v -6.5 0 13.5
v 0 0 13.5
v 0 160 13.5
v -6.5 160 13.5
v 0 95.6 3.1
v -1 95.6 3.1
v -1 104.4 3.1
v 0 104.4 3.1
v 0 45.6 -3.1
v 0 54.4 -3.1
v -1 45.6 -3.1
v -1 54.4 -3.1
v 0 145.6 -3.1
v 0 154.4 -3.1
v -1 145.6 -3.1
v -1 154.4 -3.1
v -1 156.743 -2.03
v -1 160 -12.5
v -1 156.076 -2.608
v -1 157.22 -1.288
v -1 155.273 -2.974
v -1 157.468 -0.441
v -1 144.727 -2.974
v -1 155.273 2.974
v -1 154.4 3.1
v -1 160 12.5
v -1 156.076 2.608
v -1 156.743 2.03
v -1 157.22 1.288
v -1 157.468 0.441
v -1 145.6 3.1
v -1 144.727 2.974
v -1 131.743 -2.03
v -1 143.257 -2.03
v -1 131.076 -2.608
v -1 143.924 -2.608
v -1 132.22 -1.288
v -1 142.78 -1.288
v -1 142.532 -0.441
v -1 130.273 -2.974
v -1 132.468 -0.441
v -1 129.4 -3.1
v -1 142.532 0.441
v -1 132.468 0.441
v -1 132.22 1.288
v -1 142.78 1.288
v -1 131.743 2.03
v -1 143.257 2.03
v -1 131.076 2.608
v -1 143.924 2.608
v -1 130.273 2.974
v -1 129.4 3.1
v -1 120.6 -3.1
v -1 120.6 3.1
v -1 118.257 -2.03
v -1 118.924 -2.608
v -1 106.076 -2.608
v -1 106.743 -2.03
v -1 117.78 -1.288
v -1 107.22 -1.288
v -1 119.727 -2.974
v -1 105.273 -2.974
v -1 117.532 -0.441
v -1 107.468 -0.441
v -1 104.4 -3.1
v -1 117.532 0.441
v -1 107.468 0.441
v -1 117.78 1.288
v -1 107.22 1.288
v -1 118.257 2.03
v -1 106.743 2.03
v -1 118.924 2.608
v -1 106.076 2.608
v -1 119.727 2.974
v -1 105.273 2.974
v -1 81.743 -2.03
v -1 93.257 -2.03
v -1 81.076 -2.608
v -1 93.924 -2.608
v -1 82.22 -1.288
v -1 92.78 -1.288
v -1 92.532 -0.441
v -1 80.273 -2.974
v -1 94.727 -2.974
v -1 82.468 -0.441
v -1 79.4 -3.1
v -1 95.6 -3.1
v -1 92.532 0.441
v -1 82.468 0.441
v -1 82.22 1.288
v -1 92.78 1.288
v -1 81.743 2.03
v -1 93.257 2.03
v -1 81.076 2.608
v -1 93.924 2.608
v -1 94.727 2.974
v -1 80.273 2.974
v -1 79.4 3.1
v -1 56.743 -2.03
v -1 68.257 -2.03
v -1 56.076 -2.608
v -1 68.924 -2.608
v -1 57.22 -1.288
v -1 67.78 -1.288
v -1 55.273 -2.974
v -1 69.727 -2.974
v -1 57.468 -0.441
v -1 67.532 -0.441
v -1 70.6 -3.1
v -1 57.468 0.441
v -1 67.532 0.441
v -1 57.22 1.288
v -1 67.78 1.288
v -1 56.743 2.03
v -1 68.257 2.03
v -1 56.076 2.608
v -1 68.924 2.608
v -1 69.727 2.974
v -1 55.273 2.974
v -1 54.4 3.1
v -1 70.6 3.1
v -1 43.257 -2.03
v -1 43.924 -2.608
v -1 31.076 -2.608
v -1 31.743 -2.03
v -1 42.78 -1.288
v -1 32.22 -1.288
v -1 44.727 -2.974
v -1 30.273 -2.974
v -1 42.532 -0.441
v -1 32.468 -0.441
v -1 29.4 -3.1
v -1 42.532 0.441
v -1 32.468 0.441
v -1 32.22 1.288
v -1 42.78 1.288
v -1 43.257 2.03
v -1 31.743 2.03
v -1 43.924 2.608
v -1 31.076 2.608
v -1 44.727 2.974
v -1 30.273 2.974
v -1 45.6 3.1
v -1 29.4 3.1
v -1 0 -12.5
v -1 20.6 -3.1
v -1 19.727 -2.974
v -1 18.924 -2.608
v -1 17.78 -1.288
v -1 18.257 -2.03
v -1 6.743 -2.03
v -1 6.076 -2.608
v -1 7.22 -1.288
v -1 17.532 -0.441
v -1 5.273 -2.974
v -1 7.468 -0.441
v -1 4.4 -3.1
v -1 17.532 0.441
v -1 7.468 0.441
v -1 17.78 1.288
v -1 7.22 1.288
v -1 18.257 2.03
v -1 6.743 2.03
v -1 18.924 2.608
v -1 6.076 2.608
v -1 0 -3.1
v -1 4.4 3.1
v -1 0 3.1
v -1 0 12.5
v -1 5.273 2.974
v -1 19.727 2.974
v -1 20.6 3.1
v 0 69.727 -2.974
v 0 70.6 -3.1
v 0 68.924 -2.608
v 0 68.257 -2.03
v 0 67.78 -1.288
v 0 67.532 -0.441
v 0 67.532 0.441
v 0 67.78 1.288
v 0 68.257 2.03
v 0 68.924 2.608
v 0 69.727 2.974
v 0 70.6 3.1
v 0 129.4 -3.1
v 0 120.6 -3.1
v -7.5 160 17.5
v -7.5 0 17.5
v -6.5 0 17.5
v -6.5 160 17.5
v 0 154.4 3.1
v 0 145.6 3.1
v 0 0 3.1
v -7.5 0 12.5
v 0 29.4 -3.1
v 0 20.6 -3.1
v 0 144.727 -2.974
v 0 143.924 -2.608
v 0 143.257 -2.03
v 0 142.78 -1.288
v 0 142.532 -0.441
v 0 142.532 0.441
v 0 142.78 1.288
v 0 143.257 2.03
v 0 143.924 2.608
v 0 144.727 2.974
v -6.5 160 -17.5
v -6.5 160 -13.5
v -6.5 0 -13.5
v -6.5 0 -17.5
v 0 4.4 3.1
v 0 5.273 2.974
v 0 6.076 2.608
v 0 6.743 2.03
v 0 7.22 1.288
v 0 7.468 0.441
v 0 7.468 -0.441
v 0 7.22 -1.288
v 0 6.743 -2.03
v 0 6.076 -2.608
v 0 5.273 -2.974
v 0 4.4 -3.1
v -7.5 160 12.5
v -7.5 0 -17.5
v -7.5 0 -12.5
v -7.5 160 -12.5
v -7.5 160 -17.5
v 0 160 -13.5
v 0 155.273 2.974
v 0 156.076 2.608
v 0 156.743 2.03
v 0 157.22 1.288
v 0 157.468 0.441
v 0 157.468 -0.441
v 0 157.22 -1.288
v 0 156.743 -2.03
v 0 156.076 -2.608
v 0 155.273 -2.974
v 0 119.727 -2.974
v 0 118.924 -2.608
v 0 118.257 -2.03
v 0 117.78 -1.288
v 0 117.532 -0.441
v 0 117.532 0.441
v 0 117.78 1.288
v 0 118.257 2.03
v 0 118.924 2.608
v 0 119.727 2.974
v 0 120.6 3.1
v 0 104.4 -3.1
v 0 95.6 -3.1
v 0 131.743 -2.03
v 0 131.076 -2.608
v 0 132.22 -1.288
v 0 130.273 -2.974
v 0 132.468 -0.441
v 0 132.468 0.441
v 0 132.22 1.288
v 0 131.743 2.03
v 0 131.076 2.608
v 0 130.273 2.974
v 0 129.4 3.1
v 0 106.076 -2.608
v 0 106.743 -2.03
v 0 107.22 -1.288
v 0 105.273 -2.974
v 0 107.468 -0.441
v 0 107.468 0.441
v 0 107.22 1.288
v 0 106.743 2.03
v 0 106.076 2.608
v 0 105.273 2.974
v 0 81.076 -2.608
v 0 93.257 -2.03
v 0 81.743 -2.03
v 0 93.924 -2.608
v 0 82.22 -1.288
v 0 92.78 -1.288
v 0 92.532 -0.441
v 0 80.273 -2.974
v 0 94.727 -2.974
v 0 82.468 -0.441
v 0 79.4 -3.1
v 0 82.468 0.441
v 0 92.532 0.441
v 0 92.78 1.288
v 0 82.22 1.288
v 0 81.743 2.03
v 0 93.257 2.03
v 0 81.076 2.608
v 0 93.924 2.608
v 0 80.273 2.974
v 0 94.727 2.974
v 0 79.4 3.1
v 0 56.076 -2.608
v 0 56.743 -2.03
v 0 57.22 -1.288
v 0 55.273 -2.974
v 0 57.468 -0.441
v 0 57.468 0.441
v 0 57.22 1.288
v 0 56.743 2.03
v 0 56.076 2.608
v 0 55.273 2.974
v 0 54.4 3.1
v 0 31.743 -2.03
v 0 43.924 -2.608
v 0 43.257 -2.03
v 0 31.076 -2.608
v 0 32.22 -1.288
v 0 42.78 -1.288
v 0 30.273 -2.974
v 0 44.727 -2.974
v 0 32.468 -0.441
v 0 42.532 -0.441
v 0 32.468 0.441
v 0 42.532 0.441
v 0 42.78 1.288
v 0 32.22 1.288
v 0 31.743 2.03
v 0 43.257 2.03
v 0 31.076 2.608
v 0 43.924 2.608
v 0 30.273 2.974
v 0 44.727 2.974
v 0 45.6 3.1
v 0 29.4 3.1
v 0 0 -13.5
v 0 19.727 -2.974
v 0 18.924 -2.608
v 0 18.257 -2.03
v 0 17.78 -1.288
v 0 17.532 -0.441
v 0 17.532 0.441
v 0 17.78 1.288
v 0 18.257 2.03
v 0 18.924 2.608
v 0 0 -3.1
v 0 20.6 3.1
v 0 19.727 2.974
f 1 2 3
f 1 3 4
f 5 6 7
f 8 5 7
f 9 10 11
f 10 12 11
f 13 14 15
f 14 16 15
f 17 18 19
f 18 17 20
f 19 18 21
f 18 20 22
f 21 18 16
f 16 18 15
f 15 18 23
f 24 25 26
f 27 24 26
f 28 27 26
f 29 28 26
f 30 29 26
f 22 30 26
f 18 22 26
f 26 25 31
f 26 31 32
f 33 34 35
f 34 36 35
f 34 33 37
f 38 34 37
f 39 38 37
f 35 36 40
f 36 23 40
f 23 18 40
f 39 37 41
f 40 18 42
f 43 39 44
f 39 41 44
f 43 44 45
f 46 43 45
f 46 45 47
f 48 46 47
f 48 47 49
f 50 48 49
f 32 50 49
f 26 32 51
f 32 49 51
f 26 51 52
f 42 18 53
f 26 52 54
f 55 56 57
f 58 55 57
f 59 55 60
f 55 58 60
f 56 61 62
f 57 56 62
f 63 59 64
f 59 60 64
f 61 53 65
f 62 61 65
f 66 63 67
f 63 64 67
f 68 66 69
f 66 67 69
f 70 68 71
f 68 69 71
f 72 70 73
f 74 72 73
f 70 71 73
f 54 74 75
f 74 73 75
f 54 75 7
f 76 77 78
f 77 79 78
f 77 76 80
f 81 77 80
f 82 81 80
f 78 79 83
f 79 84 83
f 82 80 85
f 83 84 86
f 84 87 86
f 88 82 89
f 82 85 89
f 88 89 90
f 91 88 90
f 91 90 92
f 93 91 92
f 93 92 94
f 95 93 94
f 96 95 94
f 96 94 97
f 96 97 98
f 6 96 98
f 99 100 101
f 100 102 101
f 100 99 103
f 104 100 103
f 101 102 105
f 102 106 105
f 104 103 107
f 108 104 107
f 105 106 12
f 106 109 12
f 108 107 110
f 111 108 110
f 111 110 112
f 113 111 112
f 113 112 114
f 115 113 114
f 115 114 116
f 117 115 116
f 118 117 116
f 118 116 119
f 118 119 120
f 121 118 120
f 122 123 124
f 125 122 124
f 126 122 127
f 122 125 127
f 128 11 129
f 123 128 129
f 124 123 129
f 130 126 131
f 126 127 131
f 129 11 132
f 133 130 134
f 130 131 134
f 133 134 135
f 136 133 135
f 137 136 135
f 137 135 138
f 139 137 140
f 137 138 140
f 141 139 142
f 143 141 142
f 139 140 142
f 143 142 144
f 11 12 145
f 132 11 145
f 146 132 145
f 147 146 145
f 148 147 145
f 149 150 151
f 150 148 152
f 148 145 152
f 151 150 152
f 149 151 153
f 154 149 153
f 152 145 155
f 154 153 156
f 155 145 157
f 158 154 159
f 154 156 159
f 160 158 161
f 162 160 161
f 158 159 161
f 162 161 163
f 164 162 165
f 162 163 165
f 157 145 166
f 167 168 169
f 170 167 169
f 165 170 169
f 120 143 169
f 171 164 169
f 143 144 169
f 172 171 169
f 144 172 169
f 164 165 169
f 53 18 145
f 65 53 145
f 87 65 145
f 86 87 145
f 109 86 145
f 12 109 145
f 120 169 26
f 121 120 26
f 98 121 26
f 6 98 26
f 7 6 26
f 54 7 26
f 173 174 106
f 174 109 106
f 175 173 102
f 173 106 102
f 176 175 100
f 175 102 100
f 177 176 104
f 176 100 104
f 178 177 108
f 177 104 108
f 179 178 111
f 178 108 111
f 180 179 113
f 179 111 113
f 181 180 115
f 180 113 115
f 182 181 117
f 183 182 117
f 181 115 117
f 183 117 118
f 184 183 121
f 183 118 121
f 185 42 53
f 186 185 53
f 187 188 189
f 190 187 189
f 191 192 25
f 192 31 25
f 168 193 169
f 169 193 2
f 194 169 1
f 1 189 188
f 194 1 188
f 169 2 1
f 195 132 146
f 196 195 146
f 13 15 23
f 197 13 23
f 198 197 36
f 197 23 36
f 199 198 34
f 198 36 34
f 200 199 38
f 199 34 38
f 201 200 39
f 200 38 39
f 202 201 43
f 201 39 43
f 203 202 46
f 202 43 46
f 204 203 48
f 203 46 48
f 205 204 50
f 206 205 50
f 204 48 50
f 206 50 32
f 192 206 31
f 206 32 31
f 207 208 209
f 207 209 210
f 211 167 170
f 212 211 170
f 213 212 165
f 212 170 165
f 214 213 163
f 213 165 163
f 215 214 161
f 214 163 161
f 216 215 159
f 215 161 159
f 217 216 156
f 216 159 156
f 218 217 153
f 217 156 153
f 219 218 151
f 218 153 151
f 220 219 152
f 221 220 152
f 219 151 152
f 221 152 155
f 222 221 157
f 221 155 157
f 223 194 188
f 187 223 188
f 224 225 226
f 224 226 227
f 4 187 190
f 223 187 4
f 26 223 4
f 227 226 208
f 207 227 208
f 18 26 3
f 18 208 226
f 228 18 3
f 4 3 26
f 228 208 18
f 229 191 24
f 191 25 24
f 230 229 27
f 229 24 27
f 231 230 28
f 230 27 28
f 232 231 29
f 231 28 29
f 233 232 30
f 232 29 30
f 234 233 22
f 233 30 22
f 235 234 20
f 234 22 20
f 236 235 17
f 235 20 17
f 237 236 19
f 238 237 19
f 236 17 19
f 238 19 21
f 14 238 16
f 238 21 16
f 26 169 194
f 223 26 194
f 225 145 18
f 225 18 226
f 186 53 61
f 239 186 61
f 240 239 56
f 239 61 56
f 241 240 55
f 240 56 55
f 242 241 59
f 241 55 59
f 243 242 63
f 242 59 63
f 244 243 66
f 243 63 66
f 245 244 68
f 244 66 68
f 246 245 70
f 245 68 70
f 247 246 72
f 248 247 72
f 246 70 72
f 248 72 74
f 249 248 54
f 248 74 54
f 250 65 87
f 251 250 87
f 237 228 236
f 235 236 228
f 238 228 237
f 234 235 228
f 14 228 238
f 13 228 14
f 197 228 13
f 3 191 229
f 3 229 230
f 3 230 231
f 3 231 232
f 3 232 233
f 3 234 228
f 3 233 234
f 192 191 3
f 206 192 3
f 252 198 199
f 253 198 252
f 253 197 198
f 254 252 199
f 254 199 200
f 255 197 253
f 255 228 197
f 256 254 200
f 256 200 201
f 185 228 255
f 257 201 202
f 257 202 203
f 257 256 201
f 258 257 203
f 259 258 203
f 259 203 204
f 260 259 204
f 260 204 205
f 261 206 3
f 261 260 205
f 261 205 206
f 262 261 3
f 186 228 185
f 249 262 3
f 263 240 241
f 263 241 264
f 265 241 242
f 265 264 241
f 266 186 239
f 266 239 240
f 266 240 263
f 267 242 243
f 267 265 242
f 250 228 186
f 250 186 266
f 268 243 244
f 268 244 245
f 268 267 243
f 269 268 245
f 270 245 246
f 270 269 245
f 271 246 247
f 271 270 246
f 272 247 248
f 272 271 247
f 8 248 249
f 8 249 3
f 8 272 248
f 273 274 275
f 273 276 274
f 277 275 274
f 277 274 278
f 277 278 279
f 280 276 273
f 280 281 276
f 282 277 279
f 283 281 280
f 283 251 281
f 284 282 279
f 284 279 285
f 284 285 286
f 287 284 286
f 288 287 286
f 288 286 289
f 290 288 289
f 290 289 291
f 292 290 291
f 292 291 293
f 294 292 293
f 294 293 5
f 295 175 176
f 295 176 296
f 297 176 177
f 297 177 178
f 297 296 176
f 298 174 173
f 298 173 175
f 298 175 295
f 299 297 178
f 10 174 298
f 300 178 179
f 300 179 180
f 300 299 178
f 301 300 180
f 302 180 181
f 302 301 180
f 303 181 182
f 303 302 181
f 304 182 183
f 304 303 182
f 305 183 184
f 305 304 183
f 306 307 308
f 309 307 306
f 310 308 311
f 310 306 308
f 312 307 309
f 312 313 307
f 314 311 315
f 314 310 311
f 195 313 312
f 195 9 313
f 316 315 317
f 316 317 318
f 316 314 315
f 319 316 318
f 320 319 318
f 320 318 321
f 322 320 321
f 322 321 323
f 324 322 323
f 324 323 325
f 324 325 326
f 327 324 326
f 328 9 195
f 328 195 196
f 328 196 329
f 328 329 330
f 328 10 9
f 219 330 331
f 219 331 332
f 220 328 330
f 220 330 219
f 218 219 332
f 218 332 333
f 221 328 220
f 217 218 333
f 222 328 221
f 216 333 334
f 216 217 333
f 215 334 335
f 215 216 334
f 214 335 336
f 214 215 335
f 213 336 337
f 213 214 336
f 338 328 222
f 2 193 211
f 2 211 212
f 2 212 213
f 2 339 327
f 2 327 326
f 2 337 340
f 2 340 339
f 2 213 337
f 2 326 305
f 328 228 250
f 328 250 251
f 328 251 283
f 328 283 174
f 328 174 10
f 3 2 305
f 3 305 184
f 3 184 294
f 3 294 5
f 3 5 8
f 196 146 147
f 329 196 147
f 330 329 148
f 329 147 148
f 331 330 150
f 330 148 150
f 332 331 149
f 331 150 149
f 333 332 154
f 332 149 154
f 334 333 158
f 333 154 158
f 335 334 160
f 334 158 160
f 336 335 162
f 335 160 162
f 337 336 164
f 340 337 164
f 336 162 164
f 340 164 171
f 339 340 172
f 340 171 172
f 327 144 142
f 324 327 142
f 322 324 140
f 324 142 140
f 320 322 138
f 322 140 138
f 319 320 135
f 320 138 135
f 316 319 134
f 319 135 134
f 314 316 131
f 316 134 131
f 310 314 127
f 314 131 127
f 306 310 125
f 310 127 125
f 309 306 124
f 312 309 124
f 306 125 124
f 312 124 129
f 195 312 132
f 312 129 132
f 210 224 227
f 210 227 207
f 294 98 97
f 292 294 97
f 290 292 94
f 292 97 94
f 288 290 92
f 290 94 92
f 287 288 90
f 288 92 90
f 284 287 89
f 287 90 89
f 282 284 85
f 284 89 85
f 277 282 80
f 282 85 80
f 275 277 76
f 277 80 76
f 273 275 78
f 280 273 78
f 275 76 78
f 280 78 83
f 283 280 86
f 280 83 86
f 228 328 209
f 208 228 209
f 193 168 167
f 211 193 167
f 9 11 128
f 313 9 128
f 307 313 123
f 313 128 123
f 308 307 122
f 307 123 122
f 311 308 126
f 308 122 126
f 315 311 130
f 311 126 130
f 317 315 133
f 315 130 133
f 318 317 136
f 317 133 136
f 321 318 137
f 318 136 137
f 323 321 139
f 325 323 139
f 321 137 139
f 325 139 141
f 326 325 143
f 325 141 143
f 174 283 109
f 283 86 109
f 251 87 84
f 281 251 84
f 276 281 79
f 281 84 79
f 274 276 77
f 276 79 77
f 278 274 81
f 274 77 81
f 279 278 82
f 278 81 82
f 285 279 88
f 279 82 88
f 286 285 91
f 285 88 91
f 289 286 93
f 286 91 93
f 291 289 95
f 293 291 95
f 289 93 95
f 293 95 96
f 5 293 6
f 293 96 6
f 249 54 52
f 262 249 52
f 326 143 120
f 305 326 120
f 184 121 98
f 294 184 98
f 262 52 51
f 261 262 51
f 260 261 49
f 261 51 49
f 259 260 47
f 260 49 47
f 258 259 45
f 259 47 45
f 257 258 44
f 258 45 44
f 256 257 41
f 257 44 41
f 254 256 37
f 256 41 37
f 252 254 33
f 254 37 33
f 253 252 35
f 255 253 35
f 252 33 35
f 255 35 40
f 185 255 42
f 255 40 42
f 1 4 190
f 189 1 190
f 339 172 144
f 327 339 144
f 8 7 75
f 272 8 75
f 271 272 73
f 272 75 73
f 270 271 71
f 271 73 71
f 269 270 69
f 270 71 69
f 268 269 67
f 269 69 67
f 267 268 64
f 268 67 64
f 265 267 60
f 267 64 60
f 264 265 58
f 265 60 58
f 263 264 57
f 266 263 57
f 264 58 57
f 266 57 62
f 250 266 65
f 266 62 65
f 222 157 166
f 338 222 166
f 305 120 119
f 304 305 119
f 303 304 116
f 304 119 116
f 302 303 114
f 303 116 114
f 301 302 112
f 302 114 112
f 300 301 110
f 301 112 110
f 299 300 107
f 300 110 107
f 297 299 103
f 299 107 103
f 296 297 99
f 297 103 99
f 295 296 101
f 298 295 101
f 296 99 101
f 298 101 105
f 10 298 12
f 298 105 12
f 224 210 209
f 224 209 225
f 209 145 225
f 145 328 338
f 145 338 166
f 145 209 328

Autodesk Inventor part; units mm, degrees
ref_plane "YZ Plane" through (0, 0, 0) normal (1, 0, 0) x (0, 1, 0)
ref_plane "XZ Plane" through (0, 0, 0) normal (0, 1, 0) x (-1, 0, 0)
ref_plane "XY Plane" through (0, 0, 0) normal (0, 0, 1) x (1, 0, 0)
sketch "Sketch1" plane through (0, 0, 0) normal (0, 1, 0) x (-1, 0, 0)
  line L0 (0, 0) -> (0, -13.5)
  line L1 (0, -13.5) -> (6.5, -13.5)
  line L2 (6.5, -13.5) -> (6.5, -17.5)
  line L3 (1, 0) -> (1, -12.5)
  line L4 (1, -12.5) -> (7.5, -12.5)
  line L5 (7.5, -12.5) -> (7.5, -17.5)
  line L6 (7.5, -17.5) -> (6.5, -17.5)
  line L7 (1, 0) -> (0, 0) construction
  line L8 (0, 0) -> (0, 13.5)
  line L9 (0, 13.5) -> (6.5, 13.5)
  line L10 (6.5, 13.5) -> (6.5, 17.5)
  line L11 (1, 0) -> (1, 12.5)
  line L12 (1, 12.5) -> (7.5, 12.5)
  line L13 (7.5, 12.5) -> (7.5, 17.5)
  line L14 (7.5, 17.5) -> (6.5, 17.5)
  dimension "d0" = 13.5
  dimension "d1" = 1
  dimension "d2" = 7.5
  dimension "d3" = 17.5
extrude "Extrusion1" add sketch "Sketch1" along normal blind 200
sketch "Sketch2" plane through (-1, 0, -12.5) normal (-1, 0, 0) x (0, 0, 1)
  line L0 (0, 0) -> (25, 0) projected
  line L1 (25, 0) -> (25, 200) projected
  line L2 (0, 200) -> (25, 200) projected
  line L3 (0, 0) -> (0, 200) projected
  line L4 (25, 0) -> (25, 200) projected
  line L5 (12.5, 104.4) -> (12.5, 95.6) construction
  line L6 (30, 0) -> (30, 200) projected
  line L7 (9.4, 104.4) -> (9.4, 95.6)
  line L8 (15.6, 95.6) -> (15.6, 104.4)
  arc A0 (15.6, 104.4) -> (9.4, 104.4) centre (12.5, 104.4) ccw
  arc A1 (9.4, 95.6) -> (15.6, 95.6) centre (12.5, 95.6) ccw
  line L9 (12.5, 129.4) -> (12.5, 120.6) construction
  line L10 (9.4, 129.4) -> (9.4, 120.6)
  line L11 (15.6, 120.6) -> (15.6, 129.4)
  arc A2 (15.6, 129.4) -> (9.4, 129.4) centre (12.5, 129.4) ccw
  arc A3 (9.4, 120.6) -> (15.6, 120.6) centre (12.5, 120.6) ccw
  line L12 (12.5, 79.4) -> (12.5, 70.6) construction
  line L13 (9.4, 79.4) -> (9.4, 70.6)
  line L14 (15.6, 70.6) -> (15.6, 79.4)
  arc A4 (15.6, 79.4) -> (9.4, 79.4) centre (12.5, 79.4) ccw
  arc A5 (9.4, 70.6) -> (15.6, 70.6) centre (12.5, 70.6) ccw
  line L15 (12.5, 154.4) -> (12.5, 145.6) construction
  line L16 (9.4, 154.4) -> (9.4, 145.6)
  line L17 (15.6, 145.6) -> (15.6, 154.4)
  arc A6 (15.6, 154.4) -> (9.4, 154.4) centre (12.5, 154.4) ccw
  arc A7 (9.4, 145.6) -> (15.6, 145.6) centre (12.5, 145.6) ccw
  line L18 (12.5, 54.4) -> (12.5, 45.6) construction
  line L19 (9.4, 54.4) -> (9.4, 45.6)
  line L20 (15.6, 45.6) -> (15.6, 54.4)
  arc A8 (15.6, 54.4) -> (9.4, 54.4) centre (12.5, 54.4) ccw
  arc A9 (9.4, 45.6) -> (15.6, 45.6) centre (12.5, 45.6) ccw
  line L21 (12.5, 179.4) -> (12.5, 170.6) construction
  line L22 (9.4, 179.4) -> (9.4, 170.6)
  line L23 (15.6, 170.6) -> (15.6, 179.4)
  arc A10 (15.6, 179.4) -> (9.4, 179.4) centre (12.5, 179.4) ccw
  arc A11 (9.4, 170.6) -> (15.6, 170.6) centre (12.5, 170.6) ccw
  line L24 (12.5, 29.4) -> (12.5, 20.6) construction
  line L25 (9.4, 29.4) -> (9.4, 20.6)
  line L26 (15.6, 20.6) -> (15.6, 29.4)
  arc A12 (15.6, 29.4) -> (9.4, 29.4) centre (12.5, 29.4) ccw
  arc A13 (9.4, 20.6) -> (15.6, 20.6) centre (12.5, 20.6) ccw
  line L27 (12.5, 204.4) -> (12.5, 195.6) construction
  line L28 (9.4, 204.4) -> (9.4, 195.6)
  line L29 (15.6, 195.6) -> (15.6, 204.4)
  arc A14 (15.6, 204.4) -> (9.4, 204.4) centre (12.5, 204.4) ccw
  arc A15 (9.4, 195.6) -> (15.6, 195.6) centre (12.5, 195.6) ccw
  line L30 (12.5, 4.4) -> (12.5, -4.4) construction
  line L31 (9.4, 4.4) -> (9.4, -4.4)
  line L32 (15.6, -4.4) -> (15.6, 4.4)
  arc A16 (15.6, 4.4) -> (9.4, 4.4) centre (12.5, 4.4) ccw
  arc A17 (9.4, -4.4) -> (15.6, -4.4) centre (12.5, -4.4) ccw
  point P0 (12.5, 0)
  point P1 (12.5, 100)
  point P2 (12.5, 200)
  point P3 (25, 100)
  point P4 (12.5, 107.5)
  point P5 (12.5, 92.5)
  point P6 (12.5, 132.5)
  point P7 (12.5, 117.5)
  point P8 (12.5, 125)
  point P9 (12.5, 82.5)
  point P10 (12.5, 67.5)
  point P11 (12.5, 75)
  point P12 (12.5, 157.5)
  point P13 (12.5, 142.5)
  point P14 (12.5, 150)
  point P15 (12.5, 57.5)
  point P16 (12.5, 42.5)
  point P17 (12.5, 50)
  point P18 (12.5, 182.5)
  point P19 (12.5, 167.5)
  point P20 (12.5, 175)
  point P21 (12.5, 32.5)
  point P22 (12.5, 17.5)
  point P23 (12.5, 25)
  point P24 (12.5, 207.5)
  point P25 (12.5, 192.5)
  point P26 (12.5, 200)
  point P27 (12.5, 7.5)
  point P28 (12.5, -7.5)
  point P29 (12.5, 0)
  point P30 (9.4, 0)
  point P31 (15.6, 0)
  dimension "d6" = 6.2
  dimension "d7" = 15
  dimension "d10" = 25
extrude "Extrusion2" cut sketch "Sketch2" against normal blind 15 contours L31 A16 L32 L0 | L28 A14 L29 L2 | L2 L29 A15 L28 | A0 L8 A1 L7 | A2 L11 A3 L10 | A4 L14 A5 L13 | A6 L17 A7 L16 | A8 L20 A9 L19 | A10 L23 A11 L22 | A12 L26 A13 L25
sketch "Sketch3" plane through (0, 200, 0) normal (0, 1, 0) x (1, 0, 0)
  line L0 (0, 3.1) -> (0, -3.1) projected
  line L1 (-1, -3.1) -> (-1, 3.1) projected
  line L2 (0, -3.1) -> (0, 3.1) projected
  line L3 (-1, -3.1) -> (0, -3.1) projected
  line L4 (-1, 3.1) -> (-1, -3.1) projected
  line L5 (-1, 3.1) -> (0, 3.1) projected
  line L6 (-1, -3.1) -> (0, -3.1) projected
  line L7 (-1, 3.1) -> (0, 3.1) projected
  line L8 (-1, 3.1) -> (0, 3.1) projected
  line L9 (0, 3.1) -> (0, -3.1) projected
  line L10 (-1, -3.1) -> (-1, 3.1) projected
  line L11 (0, 3.1) -> (0, -3.1) projected
  line L12 (-1, 3.1) -> (0, 3.1) projected
  line L13 (0, -3.1) -> (0, 3.1) projected
  line L14 (-1, -3.1) -> (0, -3.1) projected
  line L15 (-1, 3.1) -> (-1, -3.1) projected
  line L16 (-1, 3.1) -> (0, 3.1) projected
  line L17 (-1, -3.1) -> (-1, -12.5) projected
  line L18 (-1, -12.5) -> (-7.5, -12.5) projected
  line L19 (-7.5, -12.5) -> (-7.5, -17.5) projected
  line L20 (-7.5, -17.5) -> (-6.5, -17.5) projected
  line L21 (-6.5, -17.5) -> (-6.5, -13.5) projected
  line L22 (-6.5, -13.5) -> (0, -13.5) projected
  line L23 (0, -13.5) -> (0, -3.1) projected
  line L24 (0, 3.1) -> (0, 13.5) projected
  line L25 (0, 13.5) -> (-6.5, 13.5) projected
  line L26 (-6.5, 13.5) -> (-6.5, 17.5) projected
  line L27 (-6.5, 17.5) -> (-7.5, 17.5) projected
  line L28 (-7.5, 17.5) -> (-7.5, 12.5) projected
  line L29 (-7.5, 12.5) -> (-1, 12.5) projected
  line L30 (-1, 12.5) -> (-1, 3.1) projected
  line L31 (-1, -3.1) -> (0, -3.1) projected
  line L32 (-1, -3.1) -> (0, -3.1) projected
  line L33 (0, 3.1) -> (0, -3.1) projected
  line L34 (-1, 3.1) -> (0, 3.1) projected
  line L35 (-1, -3.1) -> (-1, 3.1) projected
  line L36 (-1, -3.1) -> (0, -3.1) projected
  line L37 (-1, 3.1) -> (0, 3.1) projected
  line L38 (-1, 3.1) -> (0, 3.1) projected
  line L39 (0, 3.1) -> (0, -3.1) projected
  line L40 (-1, 3.1) -> (0, 3.1) projected
  line L41 (-1, -3.1) -> (-1, 3.1) projected
  line L42 (-1, -3.1) -> (0, -3.1) projected
  line L43 (0, -3.1) -> (0, 3.1) projected
  line L44 (-1, -3.1) -> (0, -3.1) projected
  line L45 (-1, 3.1) -> (-1, -3.1) projected
  line L46 (-1, 3.1) -> (0, 3.1) projected
  line L47 (0, 3.1) -> (-1, 3.1) projected
  line L48 (-1, 12.5) -> (-1, 3.1) projected
  line L49 (-7.5, 12.5) -> (-1, 12.5) projected
  line L50 (-7.5, 17.5) -> (-7.5, 12.5) projected
  line L51 (-6.5, 17.5) -> (-7.5, 17.5) projected
  line L52 (-6.5, 13.5) -> (-6.5, 17.5) projected
  line L53 (0, 13.5) -> (-6.5, 13.5) projected
  line L54 (0, 3.1) -> (0, 13.5) projected
  line L55 (-1, -3.1) -> (0, -3.1) projected
  line L56 (-1, -3.1) -> (0, -3.1) projected
  line L57 (-1, -3.1) -> (0, -3.1) projected
  line L58 (0, -13.5) -> (0, -3.1) projected
  line L59 (-6.5, -13.5) -> (0, -13.5) projected
  line L60 (-6.5, -17.5) -> (-6.5, -13.5) projected
  line L61 (-7.5, -17.5) -> (-6.5, -17.5) projected
  line L62 (-7.5, -12.5) -> (-7.5, -17.5) projected
  line L63 (-1, -12.5) -> (-7.5, -12.5) projected
  line L64 (-1, -3.1) -> (-1, -12.5) projected
  line L65 (-1, -3.1) -> (0, -3.1) projected
  line L66 (-1, -3.1) -> (0, -3.1) projected
  line L67 (-1, -3.1) -> (0, -3.1) projected
  line L68 (-1, -3.1) -> (0, -3.1) projected
  line L69 (-1, 3.1) -> (0, 3.1) projected
  line L70 (-1, -3.1) -> (-1, 3.1) projected
  line L71 (0, 3.1) -> (0, -3.1) projected
  line L72 (0, 3.1) -> (0, -3.1) projected
  line L73 (-1, -3.1) -> (-1, 3.1) projected
  line L74 (-1, -3.1) -> (0, -3.1) projected
  line L75 (-1, 3.1) -> (0, 3.1) projected
  line L76 (-1, 3.1) -> (0, 3.1) projected
  line L77 (0, 3.1) -> (-1, 3.1) projected
  line L78 (0, 3.1) -> (-1, 3.1) projected
  line L79 (-1, -3.1) -> (0, -3.1) projected
  line L80 (-1, -3.1) -> (0, -3.1) projected
  line L81 (0, 3.1) -> (0, -3.1) projected
  line L82 (-1, -3.1) -> (-1, -12.5) projected
  line L83 (-1, -3.1) -> (-1, -12.5) projected
  line L84 (-1, -3.1) -> (-1, 3.1) projected
  line L85 (-1, 12.5) -> (-1, 3.1) projected
  line L86 (-1, 12.5) -> (-1, 3.1) projected
  line L87 (-1, 3.1) -> (-1, -3.1) projected
  line L88 (-1, -3.1) -> (-1, 3.1) projected
  line L89 (-1, 3.1) -> (-1, -3.1) projected
  line L90 (-1, -3.1) -> (-1, 3.1) projected
  line L91 (-1, 3.1) -> (-1, -3.1) projected
  line L92 (-1, -3.1) -> (-1, 3.1) projected
  line L93 (-1, 3.1) -> (-1, -3.1) projected
  line L94 (-1, -3.1) -> (-1, 3.1) projected
  line L95 (-1, 3.1) -> (-1, -3.1) projected
  line L96 (-1, -3.1) -> (-1, 3.1) projected
  line L97 (-1, 3.1) -> (-1, -3.1) projected
  line L98 (-1, -3.1) -> (-1, 3.1) projected
  line L99 (-1, 3.1) -> (-1, -3.1) projected
  line L100 (-1, -3.1) -> (-1, 3.1) projected
  line L101 (-1, 3.1) -> (-1, -3.1) projected
  line L102 (0, -3.1) -> (0, 3.1) projected
  line L103 (0, 3.1) -> (0, -3.1) projected
  line L104 (0, -3.1) -> (0, 3.1) projected
  line L105 (0, 3.1) -> (0, -3.1) projected
  line L106 (0, -3.1) -> (0, 3.1) projected
  line L107 (0, 3.1) -> (0, -3.1) projected
  line L108 (0, -3.1) -> (0, 3.1) projected
  line L109 (0, 3.1) -> (0, -3.1) projected
  line L110 (0, -3.1) -> (0, 3.1) projected
  line L111 (0, 3.1) -> (0, -3.1) projected
  line L112 (0, -3.1) -> (0, 3.1) projected
  line L113 (0, 3.1) -> (0, -3.1) projected
  line L114 (0, -3.1) -> (0, 3.1) projected
  line L115 (0, 3.1) -> (0, -3.1) projected
  line L116 (0, -3.1) -> (0, 3.1) projected
  line L117 (0, 3.1) -> (0, 13.5) projected
  line L118 (0, 3.1) -> (0, 13.5) projected
  line L119 (0, 3.1) -> (0, -3.1) projected
  line L120 (0, -13.5) -> (0, -3.1) projected
  line L121 (0, -13.5) -> (0, -3.1) projected
  line L122 (-1, 12.5) -> (-1, 3.1) projected
  line L123 (0, 3.1) -> (0, 13.5) projected
  line L124 (-7.5, 12.5) -> (-1, 12.5) projected
  line L125 (-7.5, 12.5) -> (-1, 12.5) projected
  line L126 (0, 13.5) -> (-6.5, 13.5) projected
  line L127 (0, 13.5) -> (-6.5, 13.5) projected
  line L128 (0, 13.5) -> (-6.5, 13.5) projected
  line L129 (-6.5, 13.5) -> (-6.5, 17.5) projected
  line L130 (-6.5, 13.5) -> (-6.5, 17.5) projected
  line L131 (-6.5, 13.5) -> (-6.5, 17.5) projected
  line L132 (-6.5, 17.5) -> (-7.5, 17.5) projected
  line L133 (-6.5, 17.5) -> (-7.5, 17.5) projected
  line L134 (-7.5, 17.5) -> (-7.5, 12.5) projected
  line L135 (-7.5, 17.5) -> (-7.5, 12.5) projected
  line L136 (-7.5, 17.5) -> (-7.5, 12.5) projected
  line L137 (-1, -3.1) -> (-1, 3.1) projected
  line L138 (-6.5, 17.5) -> (-7.5, 17.5) projected
  line L139 (-6.5, -13.5) -> (0, -13.5) projected
  line L140 (-7.5, 12.5) -> (-1, 12.5) projected
  line L141 (-1, -12.5) -> (-7.5, -12.5) projected
  line L142 (-1, -3.1) -> (0, -3.1) projected
  line L143 (-1, -3.1) -> (-1, -12.5) projected
  line L144 (0, -13.5) -> (0, -3.1) projected
  line L145 (-1, -12.5) -> (-7.5, -12.5) projected
  line L146 (-1, -12.5) -> (-7.5, -12.5) projected
  line L147 (-6.5, -13.5) -> (0, -13.5) projected
  line L148 (-6.5, -13.5) -> (0, -13.5) projected
  line L149 (-7.5, -12.5) -> (-7.5, -17.5) projected
  line L150 (-7.5, -12.5) -> (-7.5, -17.5) projected
  line L151 (-7.5, -12.5) -> (-7.5, -17.5) projected
  line L152 (-6.5, -17.5) -> (-6.5, -13.5) projected
  line L153 (-6.5, -17.5) -> (-6.5, -13.5) projected
  line L154 (-6.5, -17.5) -> (-6.5, -13.5) projected
  line L155 (-7.5, -17.5) -> (-6.5, -17.5) projected
  line L156 (-7.5, -17.5) -> (-6.5, -17.5) projected
  line L157 (-7.5, -17.5) -> (-6.5, -17.5) projected
  line L158 (-1, -3.1) -> (-1, 3.1) projected
  line L159 (-1, -3.1) -> (0, -3.1) projected
  line L160 (0, 3.1) -> (0, -3.1) projected
  line L161 (-1, 3.1) -> (0, 3.1) projected
  line L162 (-1, -3.1) -> (-1, 3.1) projected
  line L163 (-1, -3.1) -> (0, -3.1) projected
  line L164 (-1, 3.1) -> (0, 3.1) projected
  line L165 (-1, 3.1) -> (0, 3.1) projected
  line L166 (-1, 3.1) -> (0, 3.1) projected
  line L167 (0, -3.1) -> (0, 3.1) projected
  line L168 (-1, -3.1) -> (0, -3.1) projected
  line L169 (-1, 3.1) -> (-1, -3.1) projected
  line L170 (-1, 3.1) -> (0, 3.1) projected
  line L171 (-1, -3.1) -> (-1, 3.1) projected
  line L172 (0, 3.1) -> (0, -3.1) projected
  line L173 (-1, 3.1) -> (0, 3.1) projected
  line L174 (0, 3.1) -> (0, -3.1) projected
  line L175 (-1, 3.1) -> (0, 3.1) projected
  line L176 (-1, -3.1) -> (-1, 3.1) projected
  line L177 (-1, -3.1) -> (0, -3.1) projected
  line L178 (-1, -3.1) -> (-1, 3.1) projected
  line L179 (0, 3.1) -> (0, -3.1) projected
  line L180 (-1, -3.1) -> (0, -3.1) projected
  line L181 (-1, 3.1) -> (0, 3.1) projected
  line L182 (0, 3.1) -> (0, -3.1) projected
  line L183 (-1, 3.1) -> (0, 3.1) projected
  line L184 (-1, 3.1) -> (0, 3.1) projected
  line L185 (-1, -3.1) -> (-1, 3.1) projected
  line L186 (-1, -3.1) -> (0, -3.1) projected
  line L187 (-1, -3.1) -> (0, -3.1) projected
  line L188 (-1, 3.1) -> (0, 3.1) projected
  line L189 (-1, 3.1) -> (0, 3.1) projected
  line L190 (0, -3.1) -> (0, 3.1) projected
  line L191 (-1, -3.1) -> (0, -3.1) projected
  line L192 (-1, 3.1) -> (-1, -3.1) projected
  line L193 (-1, 3.1) -> (0, 3.1) projected
  line L194 (-1, 3.1) -> (0, 3.1) projected
  line L195 (-1, -3.1) -> (-1, 3.1) projected
  line L196 (0, 3.1) -> (0, -3.1) projected
  line L197 (-1, -3.1) -> (-1, 3.1) projected
  line L198 (0, 3.1) -> (0, -3.1) projected
  line L199 (-1, -3.1) -> (0, -3.1) projected
  line L200 (-1, 3.1) -> (0, 3.1) projected
  line L201 (-1, 3.1) -> (0, 3.1) projected
  line L202 (-1, 3.1) -> (0, 3.1) projected
  line L203 (-1, -3.1) -> (-1, 3.1) projected
  line L204 (0, 3.1) -> (0, -3.1) projected
  line L205 (-1, 3.1) -> (0, 3.1) projected
  line L206 (-1, -3.1) -> (0, -3.1) projected
  line L207 (-1, 3.1) -> (0, 3.1) projected
  line L208 (-1, -3.1) -> (0, -3.1) projected
  line L209 (-1, -3.1) -> (-1, 3.1) projected
  line L210 (0, 3.1) -> (0, -3.1) projected
  line L211 (0, 3.1) -> (0, -3.1) projected
  line L212 (-1, 3.1) -> (0, 3.1) projected
  line L213 (-1, -3.1) -> (-1, 3.1) projected
  line L214 (-1, -3.1) -> (0, -3.1) projected
  line L215 (-1, -3.1) -> (0, -3.1) projected
  line L216 (0, 3.1) -> (0, -3.1) projected
  line L217 (-1, -3.1) -> (-1, 3.1) projected
  line L218 (0, 3.1) -> (0, -3.1) projected
  line L219 (0, -3.1) -> (-1, -3.1) projected
  line L220 (-1, -3.1) -> (0, -3.1) projected
  line L221 (-1, -3.1) -> (-1, 3.1) projected
  line L222 (-1, 3.1) -> (0, 3.1) projected
  line L223 (-1, 3.1) -> (0, 3.1) projected
  line L224 (0, -3.1) -> (-1, -3.1) projected
  line L225 (-1, -3.1) -> (-1, -12.5) projected
  line L226 (-1, -12.5) -> (-7.5, -12.5) projected
  line L227 (-7.5, -12.5) -> (-7.5, -17.5) projected
  line L228 (-7.5, -17.5) -> (-6.5, -17.5) projected
  line L229 (-6.5, -17.5) -> (-6.5, -13.5) projected
  line L230 (-6.5, -13.5) -> (0, -13.5) projected
  line L231 (0, -13.5) -> (0, -3.1) projected
  line L232 (-1, 3.1) -> (0, 3.1) projected
  line L233 (0, 3.1) -> (0, 13.5) projected
  line L234 (0, 13.5) -> (-6.5, 13.5) projected
  line L235 (-6.5, 13.5) -> (-6.5, 17.5) projected
  line L236 (-6.5, 17.5) -> (-7.5, 17.5) projected
  line L237 (-7.5, 17.5) -> (-7.5, 12.5) projected
  line L238 (-7.5, 12.5) -> (-1, 12.5) projected
  line L239 (-1, 12.5) -> (-1, 3.1) projected
  line L240 (0, -3.1) -> (0, 3.1) projected
  line L241 (-1, -3.1) -> (0, -3.1) projected
  line L242 (-1, 3.1) -> (-1, -3.1) projected
  line L243 (-1, 3.1) -> (0, 3.1) projected
  line L244 (0, 3.1) -> (0, -3.1) projected
  line L245 (-1, 3.1) -> (0, 3.1) projected
  line L246 (-1, -3.1) -> (-1, 3.1) projected
  line L247 (-1, -3.1) -> (0, -3.1) projected
  line L248 (-1, -3.1) -> (0, -3.1) projected
  line L249 (-1, -3.1) -> (0, -3.1) projected
  line L250 (0, 3.1) -> (0, -3.1) projected
  line L251 (-1, 3.1) -> (0, 3.1) projected
  line L252 (-1, -3.1) -> (-1, 3.1) projected
  line L253 (-1, -3.1) -> (0, -3.1) projected
  line L254 (-1, -3.1) -> (0, -3.1) projected
  line L255 (-1, -3.1) -> (0, -3.1) projected
  line L256 (-1, 3.1) -> (0, 3.1) projected
  line L257 (-1, 3.1) -> (0, 3.1) projected
  line L258 (0, -3.1) -> (0, 3.1) projected
  line L259 (-1, -3.1) -> (0, -3.1) projected
  line L260 (-1, 3.1) -> (-1, -3.1) projected
  line L261 (-1, 3.1) -> (0, 3.1) projected
  line L262 (0, 3.1) -> (0, -3.1) projected
  line L263 (-1, 3.1) -> (0, 3.1) projected
  line L264 (-1, -3.1) -> (-1, 3.1) projected
  line L265 (-1, -3.1) -> (0, -3.1) projected
  line L266 (-1, -3.1) -> (0, -3.1) projected
  line L267 (-1, -3.1) -> (0, -3.1) projected
  line L268 (-1, 3.1) -> (0, 3.1) projected
  line L269 (-1, 3.1) -> (0, 3.1) projected
  line L270 (0, -3.1) -> (0, 3.1) projected
  line L271 (-1, -3.1) -> (0, -3.1) projected
  line L272 (-1, 3.1) -> (-1, -3.1) projected
  line L273 (-1, 3.1) -> (0, 3.1) projected
  line L274 (0, 3.1) -> (0, -3.1) projected
  line L275 (-1, 3.1) -> (0, 3.1) projected
  line L276 (-1, -3.1) -> (-1, 3.1) projected
  line L277 (-1, -3.1) -> (0, -3.1) projected
  line L278 (0, -3.1) -> (-1, -3.1) projected
  line L279 (-1, -3.1) -> (0, -3.1) projected
  line L280 (-1, 3.1) -> (0, 3.1) projected
  line L281 (-1, 3.1) -> (0, 3.1) projected
  line L282 (-1, 3.1) -> (0, 3.1) projected
  line L283 (-1, 3.1) -> (0, 3.1) projected
  line L284 (-1, -3.1) -> (0, -3.1) projected
  line L285 (-1, -3.1) -> (0, -3.1) projected
  line L286 (-1, -3.1) -> (0, -3.1) projected
  line L287 (-1, -3.1) -> (0, -3.1) projected
  point P0 (0, 0)
extrude "Extrusion3" cut sketch "Sketch3" against normal blind 40
equation "\"d15\" = d7"
properties part number "din_rail"
